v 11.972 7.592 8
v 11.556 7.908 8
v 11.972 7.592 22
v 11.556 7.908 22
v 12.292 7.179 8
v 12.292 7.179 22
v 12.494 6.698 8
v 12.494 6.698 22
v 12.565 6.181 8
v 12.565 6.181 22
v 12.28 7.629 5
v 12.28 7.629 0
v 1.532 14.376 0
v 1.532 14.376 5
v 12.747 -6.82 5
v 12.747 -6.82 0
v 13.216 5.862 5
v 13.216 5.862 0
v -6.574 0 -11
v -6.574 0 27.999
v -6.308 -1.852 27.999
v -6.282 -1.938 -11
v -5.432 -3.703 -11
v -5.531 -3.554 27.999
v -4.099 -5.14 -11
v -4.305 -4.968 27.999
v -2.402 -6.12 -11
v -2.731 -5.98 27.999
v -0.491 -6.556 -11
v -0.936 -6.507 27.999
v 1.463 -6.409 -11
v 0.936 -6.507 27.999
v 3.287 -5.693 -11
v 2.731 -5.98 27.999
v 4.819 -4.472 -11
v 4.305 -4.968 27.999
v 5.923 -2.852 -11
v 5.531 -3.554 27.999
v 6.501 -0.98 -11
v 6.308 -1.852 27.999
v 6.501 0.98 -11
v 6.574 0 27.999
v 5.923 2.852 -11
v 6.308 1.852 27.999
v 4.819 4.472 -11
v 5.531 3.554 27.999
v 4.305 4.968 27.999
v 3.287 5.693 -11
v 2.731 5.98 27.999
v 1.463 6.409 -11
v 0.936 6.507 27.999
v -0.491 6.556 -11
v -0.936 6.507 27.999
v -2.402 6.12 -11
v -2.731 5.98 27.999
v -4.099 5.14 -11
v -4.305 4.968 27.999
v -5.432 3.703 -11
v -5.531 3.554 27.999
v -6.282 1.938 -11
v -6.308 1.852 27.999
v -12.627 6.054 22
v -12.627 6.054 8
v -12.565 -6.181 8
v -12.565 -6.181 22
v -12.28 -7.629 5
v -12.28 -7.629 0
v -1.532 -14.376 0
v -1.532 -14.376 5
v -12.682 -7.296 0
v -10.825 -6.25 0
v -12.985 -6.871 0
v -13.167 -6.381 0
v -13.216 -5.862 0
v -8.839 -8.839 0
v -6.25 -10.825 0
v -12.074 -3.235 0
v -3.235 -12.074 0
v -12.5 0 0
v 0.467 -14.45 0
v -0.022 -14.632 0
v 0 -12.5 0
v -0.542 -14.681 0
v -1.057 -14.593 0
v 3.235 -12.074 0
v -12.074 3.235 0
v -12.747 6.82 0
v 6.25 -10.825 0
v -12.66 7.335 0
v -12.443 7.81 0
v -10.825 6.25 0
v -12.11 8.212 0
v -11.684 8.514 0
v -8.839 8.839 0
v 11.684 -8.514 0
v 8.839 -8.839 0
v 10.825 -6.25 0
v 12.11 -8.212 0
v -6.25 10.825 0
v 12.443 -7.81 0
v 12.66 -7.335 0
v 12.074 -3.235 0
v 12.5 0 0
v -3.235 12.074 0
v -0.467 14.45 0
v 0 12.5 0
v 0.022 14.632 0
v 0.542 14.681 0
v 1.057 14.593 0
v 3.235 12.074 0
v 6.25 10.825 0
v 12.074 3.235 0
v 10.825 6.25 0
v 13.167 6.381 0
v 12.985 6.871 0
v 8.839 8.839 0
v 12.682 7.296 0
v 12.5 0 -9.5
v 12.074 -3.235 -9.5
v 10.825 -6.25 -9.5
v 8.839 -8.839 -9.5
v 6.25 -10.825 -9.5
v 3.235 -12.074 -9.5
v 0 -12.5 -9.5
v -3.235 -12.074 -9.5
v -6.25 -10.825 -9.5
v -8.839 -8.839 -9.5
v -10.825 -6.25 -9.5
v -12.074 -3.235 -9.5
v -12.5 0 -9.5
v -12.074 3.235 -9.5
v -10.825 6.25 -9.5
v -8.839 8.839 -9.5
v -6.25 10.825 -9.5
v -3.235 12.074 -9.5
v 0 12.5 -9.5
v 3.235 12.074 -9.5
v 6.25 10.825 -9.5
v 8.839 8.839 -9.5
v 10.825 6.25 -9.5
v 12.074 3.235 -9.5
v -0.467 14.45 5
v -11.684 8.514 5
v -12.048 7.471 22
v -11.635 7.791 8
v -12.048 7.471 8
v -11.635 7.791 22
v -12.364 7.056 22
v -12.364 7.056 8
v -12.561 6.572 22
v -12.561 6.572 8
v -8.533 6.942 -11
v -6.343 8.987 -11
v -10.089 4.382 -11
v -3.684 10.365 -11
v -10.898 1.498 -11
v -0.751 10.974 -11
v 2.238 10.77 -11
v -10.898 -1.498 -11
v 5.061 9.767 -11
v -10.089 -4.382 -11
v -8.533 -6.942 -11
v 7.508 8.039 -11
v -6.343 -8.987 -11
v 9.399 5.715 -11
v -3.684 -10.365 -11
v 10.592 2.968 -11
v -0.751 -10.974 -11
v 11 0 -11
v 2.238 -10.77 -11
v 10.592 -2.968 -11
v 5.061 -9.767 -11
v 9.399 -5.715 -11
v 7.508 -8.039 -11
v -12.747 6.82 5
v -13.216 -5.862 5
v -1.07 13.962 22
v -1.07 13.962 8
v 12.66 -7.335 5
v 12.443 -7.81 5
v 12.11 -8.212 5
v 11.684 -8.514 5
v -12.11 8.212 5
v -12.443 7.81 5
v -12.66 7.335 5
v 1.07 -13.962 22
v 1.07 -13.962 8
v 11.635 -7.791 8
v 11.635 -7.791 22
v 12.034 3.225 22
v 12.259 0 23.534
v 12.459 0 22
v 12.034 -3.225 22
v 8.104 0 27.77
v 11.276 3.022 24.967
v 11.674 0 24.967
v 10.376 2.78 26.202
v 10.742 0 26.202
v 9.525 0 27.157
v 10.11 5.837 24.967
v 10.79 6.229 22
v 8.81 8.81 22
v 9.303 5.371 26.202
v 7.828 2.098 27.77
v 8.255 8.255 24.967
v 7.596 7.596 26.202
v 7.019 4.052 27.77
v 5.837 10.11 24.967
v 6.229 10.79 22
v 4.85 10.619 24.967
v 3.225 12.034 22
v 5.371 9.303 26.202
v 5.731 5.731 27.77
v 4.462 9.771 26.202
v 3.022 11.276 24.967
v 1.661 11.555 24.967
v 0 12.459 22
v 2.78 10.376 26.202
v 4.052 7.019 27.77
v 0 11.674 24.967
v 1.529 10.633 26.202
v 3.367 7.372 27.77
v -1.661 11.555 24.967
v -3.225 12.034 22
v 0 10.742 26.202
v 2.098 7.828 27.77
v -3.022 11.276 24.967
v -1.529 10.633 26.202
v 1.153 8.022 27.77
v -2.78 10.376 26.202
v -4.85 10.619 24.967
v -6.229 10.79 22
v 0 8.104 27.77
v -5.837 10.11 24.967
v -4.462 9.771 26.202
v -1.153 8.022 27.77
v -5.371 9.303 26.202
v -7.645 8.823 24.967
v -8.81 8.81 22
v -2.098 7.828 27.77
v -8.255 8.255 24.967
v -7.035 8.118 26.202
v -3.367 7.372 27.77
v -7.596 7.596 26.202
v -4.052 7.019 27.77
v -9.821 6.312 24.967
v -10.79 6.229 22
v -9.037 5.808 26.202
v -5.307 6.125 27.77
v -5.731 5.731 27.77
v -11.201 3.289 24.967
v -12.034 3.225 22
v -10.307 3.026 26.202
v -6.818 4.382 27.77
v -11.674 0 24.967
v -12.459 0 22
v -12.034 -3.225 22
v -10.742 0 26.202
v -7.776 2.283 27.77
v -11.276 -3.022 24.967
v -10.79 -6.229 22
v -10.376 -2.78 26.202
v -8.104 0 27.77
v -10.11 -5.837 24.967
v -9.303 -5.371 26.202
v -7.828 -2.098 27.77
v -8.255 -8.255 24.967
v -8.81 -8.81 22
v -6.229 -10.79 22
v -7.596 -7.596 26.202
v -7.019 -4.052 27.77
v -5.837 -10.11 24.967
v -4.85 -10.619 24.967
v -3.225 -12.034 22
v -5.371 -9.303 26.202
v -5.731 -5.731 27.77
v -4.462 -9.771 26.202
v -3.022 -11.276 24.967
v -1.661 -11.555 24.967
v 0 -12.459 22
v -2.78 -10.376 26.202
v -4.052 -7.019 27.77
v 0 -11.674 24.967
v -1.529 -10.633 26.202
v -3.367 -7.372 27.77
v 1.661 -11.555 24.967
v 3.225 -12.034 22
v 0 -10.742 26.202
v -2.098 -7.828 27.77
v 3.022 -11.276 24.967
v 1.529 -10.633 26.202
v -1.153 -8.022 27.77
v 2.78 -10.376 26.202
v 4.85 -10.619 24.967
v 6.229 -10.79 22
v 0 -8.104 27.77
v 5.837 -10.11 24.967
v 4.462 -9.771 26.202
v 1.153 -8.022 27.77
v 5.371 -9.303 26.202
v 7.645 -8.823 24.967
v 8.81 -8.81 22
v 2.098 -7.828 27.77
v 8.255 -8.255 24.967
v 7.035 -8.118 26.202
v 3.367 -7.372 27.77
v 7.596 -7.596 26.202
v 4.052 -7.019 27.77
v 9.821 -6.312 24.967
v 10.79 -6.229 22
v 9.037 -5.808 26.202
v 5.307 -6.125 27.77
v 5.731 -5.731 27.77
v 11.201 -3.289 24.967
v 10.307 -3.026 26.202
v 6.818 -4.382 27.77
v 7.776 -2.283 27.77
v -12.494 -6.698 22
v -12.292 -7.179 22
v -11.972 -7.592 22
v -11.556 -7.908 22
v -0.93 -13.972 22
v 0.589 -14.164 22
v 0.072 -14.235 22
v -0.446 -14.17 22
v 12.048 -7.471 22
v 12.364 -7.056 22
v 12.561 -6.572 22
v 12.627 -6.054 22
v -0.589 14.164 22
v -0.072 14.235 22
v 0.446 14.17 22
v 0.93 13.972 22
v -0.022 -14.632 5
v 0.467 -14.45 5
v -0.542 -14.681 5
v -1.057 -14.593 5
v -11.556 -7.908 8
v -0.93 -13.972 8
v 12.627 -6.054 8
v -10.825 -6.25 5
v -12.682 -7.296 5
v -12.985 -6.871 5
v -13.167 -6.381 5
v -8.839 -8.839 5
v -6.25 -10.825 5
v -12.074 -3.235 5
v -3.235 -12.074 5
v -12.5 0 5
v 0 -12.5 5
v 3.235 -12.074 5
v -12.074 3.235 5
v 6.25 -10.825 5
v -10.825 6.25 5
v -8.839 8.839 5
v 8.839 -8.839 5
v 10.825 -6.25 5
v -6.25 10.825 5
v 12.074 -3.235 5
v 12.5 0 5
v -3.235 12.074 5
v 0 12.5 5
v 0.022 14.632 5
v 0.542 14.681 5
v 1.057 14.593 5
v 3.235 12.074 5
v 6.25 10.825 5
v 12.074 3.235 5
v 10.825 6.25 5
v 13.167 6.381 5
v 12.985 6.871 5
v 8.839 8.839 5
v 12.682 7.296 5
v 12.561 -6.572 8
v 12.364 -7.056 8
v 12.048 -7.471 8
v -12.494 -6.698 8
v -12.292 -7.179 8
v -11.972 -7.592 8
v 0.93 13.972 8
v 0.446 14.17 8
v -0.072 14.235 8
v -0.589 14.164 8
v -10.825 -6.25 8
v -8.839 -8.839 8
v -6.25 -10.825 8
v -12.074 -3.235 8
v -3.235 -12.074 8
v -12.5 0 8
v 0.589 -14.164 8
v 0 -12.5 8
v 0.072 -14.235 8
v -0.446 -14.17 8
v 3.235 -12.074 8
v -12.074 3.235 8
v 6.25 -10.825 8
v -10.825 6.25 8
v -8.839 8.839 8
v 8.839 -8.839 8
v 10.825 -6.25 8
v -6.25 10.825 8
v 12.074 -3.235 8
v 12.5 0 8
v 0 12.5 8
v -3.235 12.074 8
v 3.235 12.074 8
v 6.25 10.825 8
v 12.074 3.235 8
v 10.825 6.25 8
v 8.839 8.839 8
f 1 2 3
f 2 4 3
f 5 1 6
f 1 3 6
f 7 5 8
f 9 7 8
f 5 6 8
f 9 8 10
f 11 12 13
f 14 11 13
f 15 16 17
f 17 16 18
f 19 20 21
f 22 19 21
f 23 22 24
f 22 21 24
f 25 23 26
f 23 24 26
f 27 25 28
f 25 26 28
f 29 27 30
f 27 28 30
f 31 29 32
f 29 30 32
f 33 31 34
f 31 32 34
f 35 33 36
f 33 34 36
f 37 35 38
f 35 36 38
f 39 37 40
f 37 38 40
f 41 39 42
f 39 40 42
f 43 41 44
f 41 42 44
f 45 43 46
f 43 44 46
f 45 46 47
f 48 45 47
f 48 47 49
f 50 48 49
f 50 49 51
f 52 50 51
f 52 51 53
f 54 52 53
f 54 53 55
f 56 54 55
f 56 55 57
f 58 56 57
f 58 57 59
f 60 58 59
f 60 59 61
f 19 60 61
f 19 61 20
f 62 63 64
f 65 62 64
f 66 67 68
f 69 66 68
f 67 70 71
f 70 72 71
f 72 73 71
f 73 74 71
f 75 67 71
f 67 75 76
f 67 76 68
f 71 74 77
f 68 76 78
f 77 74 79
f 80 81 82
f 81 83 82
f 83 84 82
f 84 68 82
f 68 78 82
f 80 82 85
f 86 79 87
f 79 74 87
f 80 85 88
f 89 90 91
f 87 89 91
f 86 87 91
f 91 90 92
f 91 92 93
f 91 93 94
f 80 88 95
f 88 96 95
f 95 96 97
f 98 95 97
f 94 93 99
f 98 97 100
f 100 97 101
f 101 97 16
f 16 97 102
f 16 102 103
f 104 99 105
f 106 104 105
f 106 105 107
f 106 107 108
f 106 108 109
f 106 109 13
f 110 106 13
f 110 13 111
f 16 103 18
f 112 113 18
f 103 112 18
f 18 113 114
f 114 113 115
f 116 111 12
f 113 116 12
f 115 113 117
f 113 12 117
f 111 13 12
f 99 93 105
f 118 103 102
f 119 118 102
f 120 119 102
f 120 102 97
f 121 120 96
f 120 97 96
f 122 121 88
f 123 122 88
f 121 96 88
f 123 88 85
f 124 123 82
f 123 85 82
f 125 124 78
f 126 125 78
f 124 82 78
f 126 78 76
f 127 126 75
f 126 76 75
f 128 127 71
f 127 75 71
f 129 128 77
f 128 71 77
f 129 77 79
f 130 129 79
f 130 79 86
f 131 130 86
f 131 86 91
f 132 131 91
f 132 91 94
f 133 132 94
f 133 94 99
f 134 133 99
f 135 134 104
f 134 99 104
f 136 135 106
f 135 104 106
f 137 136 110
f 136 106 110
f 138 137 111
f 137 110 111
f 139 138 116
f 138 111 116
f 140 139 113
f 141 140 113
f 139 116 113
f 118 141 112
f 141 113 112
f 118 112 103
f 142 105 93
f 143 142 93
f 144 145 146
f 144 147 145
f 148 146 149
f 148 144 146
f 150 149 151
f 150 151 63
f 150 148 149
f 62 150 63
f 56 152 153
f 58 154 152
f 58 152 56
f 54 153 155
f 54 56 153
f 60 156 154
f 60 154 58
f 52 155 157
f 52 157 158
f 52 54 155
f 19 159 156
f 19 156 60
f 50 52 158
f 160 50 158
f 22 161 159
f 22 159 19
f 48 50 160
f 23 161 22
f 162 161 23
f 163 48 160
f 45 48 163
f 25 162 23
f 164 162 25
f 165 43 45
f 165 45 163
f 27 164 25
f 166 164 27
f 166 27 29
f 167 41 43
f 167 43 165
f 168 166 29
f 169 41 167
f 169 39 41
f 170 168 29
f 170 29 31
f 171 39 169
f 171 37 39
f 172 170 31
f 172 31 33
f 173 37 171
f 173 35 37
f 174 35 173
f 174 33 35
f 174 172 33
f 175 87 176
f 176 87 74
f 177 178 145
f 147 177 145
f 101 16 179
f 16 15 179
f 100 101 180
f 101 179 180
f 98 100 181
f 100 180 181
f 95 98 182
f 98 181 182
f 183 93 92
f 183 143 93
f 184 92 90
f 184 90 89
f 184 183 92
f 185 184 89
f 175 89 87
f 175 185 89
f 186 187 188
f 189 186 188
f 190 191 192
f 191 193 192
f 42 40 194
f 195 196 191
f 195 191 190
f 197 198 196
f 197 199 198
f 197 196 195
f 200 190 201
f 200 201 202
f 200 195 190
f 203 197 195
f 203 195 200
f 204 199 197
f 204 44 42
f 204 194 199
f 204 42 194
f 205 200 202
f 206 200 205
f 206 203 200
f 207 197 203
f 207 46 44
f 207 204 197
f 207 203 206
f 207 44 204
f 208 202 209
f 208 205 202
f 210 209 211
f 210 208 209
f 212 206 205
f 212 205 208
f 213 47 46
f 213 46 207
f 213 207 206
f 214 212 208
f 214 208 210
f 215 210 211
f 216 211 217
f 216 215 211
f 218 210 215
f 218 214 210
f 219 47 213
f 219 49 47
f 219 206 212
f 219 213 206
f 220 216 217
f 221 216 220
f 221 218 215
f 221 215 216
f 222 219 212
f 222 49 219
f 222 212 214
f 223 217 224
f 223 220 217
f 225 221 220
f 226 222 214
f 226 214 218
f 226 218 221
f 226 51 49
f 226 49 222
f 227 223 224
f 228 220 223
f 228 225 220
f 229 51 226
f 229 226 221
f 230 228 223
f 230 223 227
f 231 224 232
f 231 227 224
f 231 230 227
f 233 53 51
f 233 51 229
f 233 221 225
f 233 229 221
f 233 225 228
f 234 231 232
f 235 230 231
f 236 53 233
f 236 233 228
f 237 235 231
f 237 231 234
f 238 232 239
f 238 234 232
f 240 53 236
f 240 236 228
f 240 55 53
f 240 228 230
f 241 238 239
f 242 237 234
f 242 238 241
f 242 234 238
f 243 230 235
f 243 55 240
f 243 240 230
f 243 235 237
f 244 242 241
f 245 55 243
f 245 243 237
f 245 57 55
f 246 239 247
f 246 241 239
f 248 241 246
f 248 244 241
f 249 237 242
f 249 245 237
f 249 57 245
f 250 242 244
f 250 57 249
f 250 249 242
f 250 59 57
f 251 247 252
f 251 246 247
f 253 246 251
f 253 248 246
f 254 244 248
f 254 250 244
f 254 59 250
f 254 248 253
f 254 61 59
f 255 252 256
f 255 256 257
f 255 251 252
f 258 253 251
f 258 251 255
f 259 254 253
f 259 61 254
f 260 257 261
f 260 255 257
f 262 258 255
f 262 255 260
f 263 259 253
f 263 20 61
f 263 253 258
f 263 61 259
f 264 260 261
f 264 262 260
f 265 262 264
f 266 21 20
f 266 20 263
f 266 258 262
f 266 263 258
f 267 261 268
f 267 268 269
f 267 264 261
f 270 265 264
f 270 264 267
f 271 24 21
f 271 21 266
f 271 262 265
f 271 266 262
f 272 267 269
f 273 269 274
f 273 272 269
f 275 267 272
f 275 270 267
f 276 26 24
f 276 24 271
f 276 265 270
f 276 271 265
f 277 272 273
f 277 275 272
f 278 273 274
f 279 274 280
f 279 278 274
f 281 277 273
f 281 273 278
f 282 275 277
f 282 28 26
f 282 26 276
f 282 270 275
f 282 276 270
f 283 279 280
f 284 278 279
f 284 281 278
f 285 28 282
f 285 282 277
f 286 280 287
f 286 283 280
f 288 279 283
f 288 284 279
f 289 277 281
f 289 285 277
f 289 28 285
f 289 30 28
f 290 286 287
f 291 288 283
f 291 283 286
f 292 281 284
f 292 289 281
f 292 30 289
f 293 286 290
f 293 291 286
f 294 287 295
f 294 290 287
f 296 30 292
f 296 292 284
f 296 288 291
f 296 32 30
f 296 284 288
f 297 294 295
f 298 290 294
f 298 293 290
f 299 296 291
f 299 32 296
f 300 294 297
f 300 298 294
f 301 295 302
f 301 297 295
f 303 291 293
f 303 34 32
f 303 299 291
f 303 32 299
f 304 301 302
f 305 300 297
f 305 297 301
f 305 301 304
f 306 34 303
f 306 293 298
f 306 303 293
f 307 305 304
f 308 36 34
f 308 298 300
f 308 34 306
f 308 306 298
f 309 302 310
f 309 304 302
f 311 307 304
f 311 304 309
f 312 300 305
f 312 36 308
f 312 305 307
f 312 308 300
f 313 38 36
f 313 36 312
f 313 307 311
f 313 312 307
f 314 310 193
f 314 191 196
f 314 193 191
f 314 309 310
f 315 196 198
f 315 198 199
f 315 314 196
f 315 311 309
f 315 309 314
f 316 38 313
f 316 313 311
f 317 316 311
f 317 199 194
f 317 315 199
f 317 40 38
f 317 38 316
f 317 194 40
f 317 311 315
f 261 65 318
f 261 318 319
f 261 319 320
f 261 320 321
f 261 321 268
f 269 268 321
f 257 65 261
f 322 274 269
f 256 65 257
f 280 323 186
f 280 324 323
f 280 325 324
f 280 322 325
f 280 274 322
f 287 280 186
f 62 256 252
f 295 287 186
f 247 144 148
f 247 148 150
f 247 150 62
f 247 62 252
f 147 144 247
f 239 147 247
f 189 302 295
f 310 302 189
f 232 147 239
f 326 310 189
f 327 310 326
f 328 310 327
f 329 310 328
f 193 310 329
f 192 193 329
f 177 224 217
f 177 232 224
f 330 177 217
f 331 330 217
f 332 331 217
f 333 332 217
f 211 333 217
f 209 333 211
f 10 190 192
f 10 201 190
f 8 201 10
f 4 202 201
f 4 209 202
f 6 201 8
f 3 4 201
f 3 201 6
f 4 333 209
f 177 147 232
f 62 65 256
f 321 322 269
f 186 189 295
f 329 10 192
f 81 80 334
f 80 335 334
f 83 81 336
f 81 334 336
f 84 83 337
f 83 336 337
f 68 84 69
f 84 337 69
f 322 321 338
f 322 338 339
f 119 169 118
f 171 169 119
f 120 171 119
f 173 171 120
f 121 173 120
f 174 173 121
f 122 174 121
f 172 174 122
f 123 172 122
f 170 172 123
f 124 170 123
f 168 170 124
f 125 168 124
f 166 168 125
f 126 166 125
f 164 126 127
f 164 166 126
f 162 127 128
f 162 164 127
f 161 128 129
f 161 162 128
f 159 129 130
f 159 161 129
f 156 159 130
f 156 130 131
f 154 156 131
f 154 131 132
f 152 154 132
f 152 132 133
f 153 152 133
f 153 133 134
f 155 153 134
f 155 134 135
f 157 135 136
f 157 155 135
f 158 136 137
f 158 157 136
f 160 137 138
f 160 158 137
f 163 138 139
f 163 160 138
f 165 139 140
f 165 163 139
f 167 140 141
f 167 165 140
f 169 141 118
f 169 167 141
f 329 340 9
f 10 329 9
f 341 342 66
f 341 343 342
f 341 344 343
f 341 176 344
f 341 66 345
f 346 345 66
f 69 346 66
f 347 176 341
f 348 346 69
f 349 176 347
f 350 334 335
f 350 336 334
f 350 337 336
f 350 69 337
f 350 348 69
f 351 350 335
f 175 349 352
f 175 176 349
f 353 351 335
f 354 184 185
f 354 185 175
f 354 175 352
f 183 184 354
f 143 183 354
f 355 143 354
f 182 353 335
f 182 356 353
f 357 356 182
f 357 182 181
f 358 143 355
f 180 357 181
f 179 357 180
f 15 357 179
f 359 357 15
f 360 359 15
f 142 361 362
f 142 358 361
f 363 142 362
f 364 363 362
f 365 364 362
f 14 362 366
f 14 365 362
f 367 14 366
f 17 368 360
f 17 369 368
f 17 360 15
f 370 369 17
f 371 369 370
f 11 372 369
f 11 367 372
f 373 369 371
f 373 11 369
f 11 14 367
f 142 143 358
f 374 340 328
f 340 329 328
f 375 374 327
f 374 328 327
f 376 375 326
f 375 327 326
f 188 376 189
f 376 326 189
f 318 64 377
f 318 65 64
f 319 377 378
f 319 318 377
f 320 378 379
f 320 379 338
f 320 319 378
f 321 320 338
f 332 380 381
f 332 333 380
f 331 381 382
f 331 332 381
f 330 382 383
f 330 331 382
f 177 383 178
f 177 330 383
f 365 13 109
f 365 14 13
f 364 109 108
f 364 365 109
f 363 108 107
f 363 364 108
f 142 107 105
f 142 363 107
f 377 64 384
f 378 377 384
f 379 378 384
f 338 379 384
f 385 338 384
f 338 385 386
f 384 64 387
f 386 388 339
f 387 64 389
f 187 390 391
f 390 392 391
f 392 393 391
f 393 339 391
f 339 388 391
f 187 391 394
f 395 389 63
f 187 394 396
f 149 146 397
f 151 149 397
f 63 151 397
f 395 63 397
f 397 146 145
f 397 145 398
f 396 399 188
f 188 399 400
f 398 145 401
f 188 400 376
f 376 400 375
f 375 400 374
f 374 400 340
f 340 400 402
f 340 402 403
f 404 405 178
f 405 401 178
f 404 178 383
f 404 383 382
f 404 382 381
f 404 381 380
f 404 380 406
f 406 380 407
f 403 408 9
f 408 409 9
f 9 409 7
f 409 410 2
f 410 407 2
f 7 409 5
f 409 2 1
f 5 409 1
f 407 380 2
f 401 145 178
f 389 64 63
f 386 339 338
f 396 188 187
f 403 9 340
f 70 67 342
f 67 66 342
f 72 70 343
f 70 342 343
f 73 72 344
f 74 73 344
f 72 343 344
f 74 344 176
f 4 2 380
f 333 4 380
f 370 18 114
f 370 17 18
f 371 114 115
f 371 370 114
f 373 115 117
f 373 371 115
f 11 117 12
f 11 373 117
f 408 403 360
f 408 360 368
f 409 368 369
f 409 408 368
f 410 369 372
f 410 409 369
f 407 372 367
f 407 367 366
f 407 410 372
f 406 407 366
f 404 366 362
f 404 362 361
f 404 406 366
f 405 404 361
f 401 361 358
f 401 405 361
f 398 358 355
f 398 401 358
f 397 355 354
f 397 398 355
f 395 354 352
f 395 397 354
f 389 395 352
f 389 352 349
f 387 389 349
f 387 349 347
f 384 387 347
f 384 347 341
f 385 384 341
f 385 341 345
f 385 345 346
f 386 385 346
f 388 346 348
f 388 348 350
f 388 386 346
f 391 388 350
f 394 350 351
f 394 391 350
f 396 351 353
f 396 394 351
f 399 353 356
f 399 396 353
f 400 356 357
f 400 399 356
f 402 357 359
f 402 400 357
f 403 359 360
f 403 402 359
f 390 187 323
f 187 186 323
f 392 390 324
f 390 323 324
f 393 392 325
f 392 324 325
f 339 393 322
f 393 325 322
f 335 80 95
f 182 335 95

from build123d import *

# Parameters (mm, degrees)
EXTRUDE_1_DEPTH     = 5
SKETCH_3_R          = 12.5
EXTRUDE_2_DEPTH     = 11
CHAMFER_1_SIZE      = 1.5
EXTRUDE_START       = 3
SKETCH_4_R          = 12.5
EXTRUDE_3_DEPTH     = 3
EXTRUDE_4_DEPTH     = 14
SKETCH_6_R          = 12.458994032
EXTRUDE_5_DEPTH     = 6
FILLET_1_R          = 6
SKETCH_7_R          = 6.574183754
CUT_EXTRUDE_1_DEPTH = 42
FILLET_2_R          = 2


with BuildPart() as part:
    # Эскиз2 → Бобышка-Вытянуть1 (new body)
    with BuildSketch(Plane.XY):
        Polygon((12.704765165, -7.974267497), (13.258300811, 7.015515633), (0.553535647, 14.98978313), (-12.704765165, 7.974267497), (-13.258300811, -7.015515633), (-0.553535647, -14.98978313), align=None)
    extrude(amount=EXTRUDE_1_DEPTH)

    # Эскиз3 → Бобышка-Вытянуть2 (add)
    with BuildSketch(Plane(origin=(0, 0, 0), x_dir=(-1, 0, 0), z_dir=(0, 0, -1))):
        with Locations(Location((0, 0, 0), (0, 0, 180))):
            Circle(SKETCH_3_R)
    extrude(amount=EXTRUDE_2_DEPTH)

    # Фаска1
    chamfer_1_edges = [part.edges().sort_by_distance(p)[0] for p in [
        (-12.5, 0, -11),
    ]]
    chamfer(chamfer_1_edges, length=CHAMFER_1_SIZE)

    # Эскиз4 → Бобышка-Вытянуть3 (add)
    with BuildSketch(Plane.XY.offset(5).offset(EXTRUDE_START)):
        Circle(SKETCH_4_R)
    extrude(amount=-EXTRUDE_3_DEPTH)

    # Эскиз5 → Бобышка-Вытянуть4 (add)
    with BuildSketch(Plane.XY.offset(8)):
        Polygon((12.559385181, 7.335539252), (-0.073070753, 14.544516248), (-12.632455933, 7.208976996), (-12.559385181, -7.335539252), (0.073070753, -14.544516248), (12.632455933, -7.208976996), align=None)
    extrude(amount=EXTRUDE_4_DEPTH)

    # Эскиз6 → Бобышка-Вытянуть5 (add)
    with BuildSketch(Plane.XY.offset(22)):
        Circle(SKETCH_6_R)
    extrude(amount=EXTRUDE_5_DEPTH)

    # Скругление1
    fillet_1_edges = [part.edges().sort_by_distance(p)[0] for p in [
        (-12.458994032, 0, 28),
    ]]
    fillet(fillet_1_edges, radius=FILLET_1_R - 0.0001)  # a hair under: the kernel refuses the full size

    # Эскиз7 → Вырез-Вытянуть1 (cut)
    with BuildSketch(Plane.XY.offset(28)):
        with Locations(Location((0, 0, 0), (0, 0, 180))):
            Circle(SKETCH_7_R)
    extrude(amount=-CUT_EXTRUDE_1_DEPTH, mode=Mode.SUBTRACT)

    # Скругление2
    fillet_2_edges = [part.edges().sort_by_distance(p)[0] for p in [
        (-0.553535647, -14.98978313, 2.5),
        (-13.258300811, -7.015515633, 2.5),
        (-12.704765165, 7.974267497, 2.5),
        (0.553535647, 14.98978313, 2.5),
        (13.258300811, 7.015515633, 2.5),
        (12.704765165, -7.974267497, 2.5),
        (12.632455933, -7.208976996, 15),
        (12.559385181, 7.335539252, 15),
        (-0.073070753, 14.544516248, 15),
        (-12.632455933, 7.208976996, 15),
        (-12.559385181, -7.335539252, 15),
        (0.073070753, -14.544516248, 15),
    ]]
    fillet(fillet_2_edges, radius=FILLET_2_R)


solid = part.part
